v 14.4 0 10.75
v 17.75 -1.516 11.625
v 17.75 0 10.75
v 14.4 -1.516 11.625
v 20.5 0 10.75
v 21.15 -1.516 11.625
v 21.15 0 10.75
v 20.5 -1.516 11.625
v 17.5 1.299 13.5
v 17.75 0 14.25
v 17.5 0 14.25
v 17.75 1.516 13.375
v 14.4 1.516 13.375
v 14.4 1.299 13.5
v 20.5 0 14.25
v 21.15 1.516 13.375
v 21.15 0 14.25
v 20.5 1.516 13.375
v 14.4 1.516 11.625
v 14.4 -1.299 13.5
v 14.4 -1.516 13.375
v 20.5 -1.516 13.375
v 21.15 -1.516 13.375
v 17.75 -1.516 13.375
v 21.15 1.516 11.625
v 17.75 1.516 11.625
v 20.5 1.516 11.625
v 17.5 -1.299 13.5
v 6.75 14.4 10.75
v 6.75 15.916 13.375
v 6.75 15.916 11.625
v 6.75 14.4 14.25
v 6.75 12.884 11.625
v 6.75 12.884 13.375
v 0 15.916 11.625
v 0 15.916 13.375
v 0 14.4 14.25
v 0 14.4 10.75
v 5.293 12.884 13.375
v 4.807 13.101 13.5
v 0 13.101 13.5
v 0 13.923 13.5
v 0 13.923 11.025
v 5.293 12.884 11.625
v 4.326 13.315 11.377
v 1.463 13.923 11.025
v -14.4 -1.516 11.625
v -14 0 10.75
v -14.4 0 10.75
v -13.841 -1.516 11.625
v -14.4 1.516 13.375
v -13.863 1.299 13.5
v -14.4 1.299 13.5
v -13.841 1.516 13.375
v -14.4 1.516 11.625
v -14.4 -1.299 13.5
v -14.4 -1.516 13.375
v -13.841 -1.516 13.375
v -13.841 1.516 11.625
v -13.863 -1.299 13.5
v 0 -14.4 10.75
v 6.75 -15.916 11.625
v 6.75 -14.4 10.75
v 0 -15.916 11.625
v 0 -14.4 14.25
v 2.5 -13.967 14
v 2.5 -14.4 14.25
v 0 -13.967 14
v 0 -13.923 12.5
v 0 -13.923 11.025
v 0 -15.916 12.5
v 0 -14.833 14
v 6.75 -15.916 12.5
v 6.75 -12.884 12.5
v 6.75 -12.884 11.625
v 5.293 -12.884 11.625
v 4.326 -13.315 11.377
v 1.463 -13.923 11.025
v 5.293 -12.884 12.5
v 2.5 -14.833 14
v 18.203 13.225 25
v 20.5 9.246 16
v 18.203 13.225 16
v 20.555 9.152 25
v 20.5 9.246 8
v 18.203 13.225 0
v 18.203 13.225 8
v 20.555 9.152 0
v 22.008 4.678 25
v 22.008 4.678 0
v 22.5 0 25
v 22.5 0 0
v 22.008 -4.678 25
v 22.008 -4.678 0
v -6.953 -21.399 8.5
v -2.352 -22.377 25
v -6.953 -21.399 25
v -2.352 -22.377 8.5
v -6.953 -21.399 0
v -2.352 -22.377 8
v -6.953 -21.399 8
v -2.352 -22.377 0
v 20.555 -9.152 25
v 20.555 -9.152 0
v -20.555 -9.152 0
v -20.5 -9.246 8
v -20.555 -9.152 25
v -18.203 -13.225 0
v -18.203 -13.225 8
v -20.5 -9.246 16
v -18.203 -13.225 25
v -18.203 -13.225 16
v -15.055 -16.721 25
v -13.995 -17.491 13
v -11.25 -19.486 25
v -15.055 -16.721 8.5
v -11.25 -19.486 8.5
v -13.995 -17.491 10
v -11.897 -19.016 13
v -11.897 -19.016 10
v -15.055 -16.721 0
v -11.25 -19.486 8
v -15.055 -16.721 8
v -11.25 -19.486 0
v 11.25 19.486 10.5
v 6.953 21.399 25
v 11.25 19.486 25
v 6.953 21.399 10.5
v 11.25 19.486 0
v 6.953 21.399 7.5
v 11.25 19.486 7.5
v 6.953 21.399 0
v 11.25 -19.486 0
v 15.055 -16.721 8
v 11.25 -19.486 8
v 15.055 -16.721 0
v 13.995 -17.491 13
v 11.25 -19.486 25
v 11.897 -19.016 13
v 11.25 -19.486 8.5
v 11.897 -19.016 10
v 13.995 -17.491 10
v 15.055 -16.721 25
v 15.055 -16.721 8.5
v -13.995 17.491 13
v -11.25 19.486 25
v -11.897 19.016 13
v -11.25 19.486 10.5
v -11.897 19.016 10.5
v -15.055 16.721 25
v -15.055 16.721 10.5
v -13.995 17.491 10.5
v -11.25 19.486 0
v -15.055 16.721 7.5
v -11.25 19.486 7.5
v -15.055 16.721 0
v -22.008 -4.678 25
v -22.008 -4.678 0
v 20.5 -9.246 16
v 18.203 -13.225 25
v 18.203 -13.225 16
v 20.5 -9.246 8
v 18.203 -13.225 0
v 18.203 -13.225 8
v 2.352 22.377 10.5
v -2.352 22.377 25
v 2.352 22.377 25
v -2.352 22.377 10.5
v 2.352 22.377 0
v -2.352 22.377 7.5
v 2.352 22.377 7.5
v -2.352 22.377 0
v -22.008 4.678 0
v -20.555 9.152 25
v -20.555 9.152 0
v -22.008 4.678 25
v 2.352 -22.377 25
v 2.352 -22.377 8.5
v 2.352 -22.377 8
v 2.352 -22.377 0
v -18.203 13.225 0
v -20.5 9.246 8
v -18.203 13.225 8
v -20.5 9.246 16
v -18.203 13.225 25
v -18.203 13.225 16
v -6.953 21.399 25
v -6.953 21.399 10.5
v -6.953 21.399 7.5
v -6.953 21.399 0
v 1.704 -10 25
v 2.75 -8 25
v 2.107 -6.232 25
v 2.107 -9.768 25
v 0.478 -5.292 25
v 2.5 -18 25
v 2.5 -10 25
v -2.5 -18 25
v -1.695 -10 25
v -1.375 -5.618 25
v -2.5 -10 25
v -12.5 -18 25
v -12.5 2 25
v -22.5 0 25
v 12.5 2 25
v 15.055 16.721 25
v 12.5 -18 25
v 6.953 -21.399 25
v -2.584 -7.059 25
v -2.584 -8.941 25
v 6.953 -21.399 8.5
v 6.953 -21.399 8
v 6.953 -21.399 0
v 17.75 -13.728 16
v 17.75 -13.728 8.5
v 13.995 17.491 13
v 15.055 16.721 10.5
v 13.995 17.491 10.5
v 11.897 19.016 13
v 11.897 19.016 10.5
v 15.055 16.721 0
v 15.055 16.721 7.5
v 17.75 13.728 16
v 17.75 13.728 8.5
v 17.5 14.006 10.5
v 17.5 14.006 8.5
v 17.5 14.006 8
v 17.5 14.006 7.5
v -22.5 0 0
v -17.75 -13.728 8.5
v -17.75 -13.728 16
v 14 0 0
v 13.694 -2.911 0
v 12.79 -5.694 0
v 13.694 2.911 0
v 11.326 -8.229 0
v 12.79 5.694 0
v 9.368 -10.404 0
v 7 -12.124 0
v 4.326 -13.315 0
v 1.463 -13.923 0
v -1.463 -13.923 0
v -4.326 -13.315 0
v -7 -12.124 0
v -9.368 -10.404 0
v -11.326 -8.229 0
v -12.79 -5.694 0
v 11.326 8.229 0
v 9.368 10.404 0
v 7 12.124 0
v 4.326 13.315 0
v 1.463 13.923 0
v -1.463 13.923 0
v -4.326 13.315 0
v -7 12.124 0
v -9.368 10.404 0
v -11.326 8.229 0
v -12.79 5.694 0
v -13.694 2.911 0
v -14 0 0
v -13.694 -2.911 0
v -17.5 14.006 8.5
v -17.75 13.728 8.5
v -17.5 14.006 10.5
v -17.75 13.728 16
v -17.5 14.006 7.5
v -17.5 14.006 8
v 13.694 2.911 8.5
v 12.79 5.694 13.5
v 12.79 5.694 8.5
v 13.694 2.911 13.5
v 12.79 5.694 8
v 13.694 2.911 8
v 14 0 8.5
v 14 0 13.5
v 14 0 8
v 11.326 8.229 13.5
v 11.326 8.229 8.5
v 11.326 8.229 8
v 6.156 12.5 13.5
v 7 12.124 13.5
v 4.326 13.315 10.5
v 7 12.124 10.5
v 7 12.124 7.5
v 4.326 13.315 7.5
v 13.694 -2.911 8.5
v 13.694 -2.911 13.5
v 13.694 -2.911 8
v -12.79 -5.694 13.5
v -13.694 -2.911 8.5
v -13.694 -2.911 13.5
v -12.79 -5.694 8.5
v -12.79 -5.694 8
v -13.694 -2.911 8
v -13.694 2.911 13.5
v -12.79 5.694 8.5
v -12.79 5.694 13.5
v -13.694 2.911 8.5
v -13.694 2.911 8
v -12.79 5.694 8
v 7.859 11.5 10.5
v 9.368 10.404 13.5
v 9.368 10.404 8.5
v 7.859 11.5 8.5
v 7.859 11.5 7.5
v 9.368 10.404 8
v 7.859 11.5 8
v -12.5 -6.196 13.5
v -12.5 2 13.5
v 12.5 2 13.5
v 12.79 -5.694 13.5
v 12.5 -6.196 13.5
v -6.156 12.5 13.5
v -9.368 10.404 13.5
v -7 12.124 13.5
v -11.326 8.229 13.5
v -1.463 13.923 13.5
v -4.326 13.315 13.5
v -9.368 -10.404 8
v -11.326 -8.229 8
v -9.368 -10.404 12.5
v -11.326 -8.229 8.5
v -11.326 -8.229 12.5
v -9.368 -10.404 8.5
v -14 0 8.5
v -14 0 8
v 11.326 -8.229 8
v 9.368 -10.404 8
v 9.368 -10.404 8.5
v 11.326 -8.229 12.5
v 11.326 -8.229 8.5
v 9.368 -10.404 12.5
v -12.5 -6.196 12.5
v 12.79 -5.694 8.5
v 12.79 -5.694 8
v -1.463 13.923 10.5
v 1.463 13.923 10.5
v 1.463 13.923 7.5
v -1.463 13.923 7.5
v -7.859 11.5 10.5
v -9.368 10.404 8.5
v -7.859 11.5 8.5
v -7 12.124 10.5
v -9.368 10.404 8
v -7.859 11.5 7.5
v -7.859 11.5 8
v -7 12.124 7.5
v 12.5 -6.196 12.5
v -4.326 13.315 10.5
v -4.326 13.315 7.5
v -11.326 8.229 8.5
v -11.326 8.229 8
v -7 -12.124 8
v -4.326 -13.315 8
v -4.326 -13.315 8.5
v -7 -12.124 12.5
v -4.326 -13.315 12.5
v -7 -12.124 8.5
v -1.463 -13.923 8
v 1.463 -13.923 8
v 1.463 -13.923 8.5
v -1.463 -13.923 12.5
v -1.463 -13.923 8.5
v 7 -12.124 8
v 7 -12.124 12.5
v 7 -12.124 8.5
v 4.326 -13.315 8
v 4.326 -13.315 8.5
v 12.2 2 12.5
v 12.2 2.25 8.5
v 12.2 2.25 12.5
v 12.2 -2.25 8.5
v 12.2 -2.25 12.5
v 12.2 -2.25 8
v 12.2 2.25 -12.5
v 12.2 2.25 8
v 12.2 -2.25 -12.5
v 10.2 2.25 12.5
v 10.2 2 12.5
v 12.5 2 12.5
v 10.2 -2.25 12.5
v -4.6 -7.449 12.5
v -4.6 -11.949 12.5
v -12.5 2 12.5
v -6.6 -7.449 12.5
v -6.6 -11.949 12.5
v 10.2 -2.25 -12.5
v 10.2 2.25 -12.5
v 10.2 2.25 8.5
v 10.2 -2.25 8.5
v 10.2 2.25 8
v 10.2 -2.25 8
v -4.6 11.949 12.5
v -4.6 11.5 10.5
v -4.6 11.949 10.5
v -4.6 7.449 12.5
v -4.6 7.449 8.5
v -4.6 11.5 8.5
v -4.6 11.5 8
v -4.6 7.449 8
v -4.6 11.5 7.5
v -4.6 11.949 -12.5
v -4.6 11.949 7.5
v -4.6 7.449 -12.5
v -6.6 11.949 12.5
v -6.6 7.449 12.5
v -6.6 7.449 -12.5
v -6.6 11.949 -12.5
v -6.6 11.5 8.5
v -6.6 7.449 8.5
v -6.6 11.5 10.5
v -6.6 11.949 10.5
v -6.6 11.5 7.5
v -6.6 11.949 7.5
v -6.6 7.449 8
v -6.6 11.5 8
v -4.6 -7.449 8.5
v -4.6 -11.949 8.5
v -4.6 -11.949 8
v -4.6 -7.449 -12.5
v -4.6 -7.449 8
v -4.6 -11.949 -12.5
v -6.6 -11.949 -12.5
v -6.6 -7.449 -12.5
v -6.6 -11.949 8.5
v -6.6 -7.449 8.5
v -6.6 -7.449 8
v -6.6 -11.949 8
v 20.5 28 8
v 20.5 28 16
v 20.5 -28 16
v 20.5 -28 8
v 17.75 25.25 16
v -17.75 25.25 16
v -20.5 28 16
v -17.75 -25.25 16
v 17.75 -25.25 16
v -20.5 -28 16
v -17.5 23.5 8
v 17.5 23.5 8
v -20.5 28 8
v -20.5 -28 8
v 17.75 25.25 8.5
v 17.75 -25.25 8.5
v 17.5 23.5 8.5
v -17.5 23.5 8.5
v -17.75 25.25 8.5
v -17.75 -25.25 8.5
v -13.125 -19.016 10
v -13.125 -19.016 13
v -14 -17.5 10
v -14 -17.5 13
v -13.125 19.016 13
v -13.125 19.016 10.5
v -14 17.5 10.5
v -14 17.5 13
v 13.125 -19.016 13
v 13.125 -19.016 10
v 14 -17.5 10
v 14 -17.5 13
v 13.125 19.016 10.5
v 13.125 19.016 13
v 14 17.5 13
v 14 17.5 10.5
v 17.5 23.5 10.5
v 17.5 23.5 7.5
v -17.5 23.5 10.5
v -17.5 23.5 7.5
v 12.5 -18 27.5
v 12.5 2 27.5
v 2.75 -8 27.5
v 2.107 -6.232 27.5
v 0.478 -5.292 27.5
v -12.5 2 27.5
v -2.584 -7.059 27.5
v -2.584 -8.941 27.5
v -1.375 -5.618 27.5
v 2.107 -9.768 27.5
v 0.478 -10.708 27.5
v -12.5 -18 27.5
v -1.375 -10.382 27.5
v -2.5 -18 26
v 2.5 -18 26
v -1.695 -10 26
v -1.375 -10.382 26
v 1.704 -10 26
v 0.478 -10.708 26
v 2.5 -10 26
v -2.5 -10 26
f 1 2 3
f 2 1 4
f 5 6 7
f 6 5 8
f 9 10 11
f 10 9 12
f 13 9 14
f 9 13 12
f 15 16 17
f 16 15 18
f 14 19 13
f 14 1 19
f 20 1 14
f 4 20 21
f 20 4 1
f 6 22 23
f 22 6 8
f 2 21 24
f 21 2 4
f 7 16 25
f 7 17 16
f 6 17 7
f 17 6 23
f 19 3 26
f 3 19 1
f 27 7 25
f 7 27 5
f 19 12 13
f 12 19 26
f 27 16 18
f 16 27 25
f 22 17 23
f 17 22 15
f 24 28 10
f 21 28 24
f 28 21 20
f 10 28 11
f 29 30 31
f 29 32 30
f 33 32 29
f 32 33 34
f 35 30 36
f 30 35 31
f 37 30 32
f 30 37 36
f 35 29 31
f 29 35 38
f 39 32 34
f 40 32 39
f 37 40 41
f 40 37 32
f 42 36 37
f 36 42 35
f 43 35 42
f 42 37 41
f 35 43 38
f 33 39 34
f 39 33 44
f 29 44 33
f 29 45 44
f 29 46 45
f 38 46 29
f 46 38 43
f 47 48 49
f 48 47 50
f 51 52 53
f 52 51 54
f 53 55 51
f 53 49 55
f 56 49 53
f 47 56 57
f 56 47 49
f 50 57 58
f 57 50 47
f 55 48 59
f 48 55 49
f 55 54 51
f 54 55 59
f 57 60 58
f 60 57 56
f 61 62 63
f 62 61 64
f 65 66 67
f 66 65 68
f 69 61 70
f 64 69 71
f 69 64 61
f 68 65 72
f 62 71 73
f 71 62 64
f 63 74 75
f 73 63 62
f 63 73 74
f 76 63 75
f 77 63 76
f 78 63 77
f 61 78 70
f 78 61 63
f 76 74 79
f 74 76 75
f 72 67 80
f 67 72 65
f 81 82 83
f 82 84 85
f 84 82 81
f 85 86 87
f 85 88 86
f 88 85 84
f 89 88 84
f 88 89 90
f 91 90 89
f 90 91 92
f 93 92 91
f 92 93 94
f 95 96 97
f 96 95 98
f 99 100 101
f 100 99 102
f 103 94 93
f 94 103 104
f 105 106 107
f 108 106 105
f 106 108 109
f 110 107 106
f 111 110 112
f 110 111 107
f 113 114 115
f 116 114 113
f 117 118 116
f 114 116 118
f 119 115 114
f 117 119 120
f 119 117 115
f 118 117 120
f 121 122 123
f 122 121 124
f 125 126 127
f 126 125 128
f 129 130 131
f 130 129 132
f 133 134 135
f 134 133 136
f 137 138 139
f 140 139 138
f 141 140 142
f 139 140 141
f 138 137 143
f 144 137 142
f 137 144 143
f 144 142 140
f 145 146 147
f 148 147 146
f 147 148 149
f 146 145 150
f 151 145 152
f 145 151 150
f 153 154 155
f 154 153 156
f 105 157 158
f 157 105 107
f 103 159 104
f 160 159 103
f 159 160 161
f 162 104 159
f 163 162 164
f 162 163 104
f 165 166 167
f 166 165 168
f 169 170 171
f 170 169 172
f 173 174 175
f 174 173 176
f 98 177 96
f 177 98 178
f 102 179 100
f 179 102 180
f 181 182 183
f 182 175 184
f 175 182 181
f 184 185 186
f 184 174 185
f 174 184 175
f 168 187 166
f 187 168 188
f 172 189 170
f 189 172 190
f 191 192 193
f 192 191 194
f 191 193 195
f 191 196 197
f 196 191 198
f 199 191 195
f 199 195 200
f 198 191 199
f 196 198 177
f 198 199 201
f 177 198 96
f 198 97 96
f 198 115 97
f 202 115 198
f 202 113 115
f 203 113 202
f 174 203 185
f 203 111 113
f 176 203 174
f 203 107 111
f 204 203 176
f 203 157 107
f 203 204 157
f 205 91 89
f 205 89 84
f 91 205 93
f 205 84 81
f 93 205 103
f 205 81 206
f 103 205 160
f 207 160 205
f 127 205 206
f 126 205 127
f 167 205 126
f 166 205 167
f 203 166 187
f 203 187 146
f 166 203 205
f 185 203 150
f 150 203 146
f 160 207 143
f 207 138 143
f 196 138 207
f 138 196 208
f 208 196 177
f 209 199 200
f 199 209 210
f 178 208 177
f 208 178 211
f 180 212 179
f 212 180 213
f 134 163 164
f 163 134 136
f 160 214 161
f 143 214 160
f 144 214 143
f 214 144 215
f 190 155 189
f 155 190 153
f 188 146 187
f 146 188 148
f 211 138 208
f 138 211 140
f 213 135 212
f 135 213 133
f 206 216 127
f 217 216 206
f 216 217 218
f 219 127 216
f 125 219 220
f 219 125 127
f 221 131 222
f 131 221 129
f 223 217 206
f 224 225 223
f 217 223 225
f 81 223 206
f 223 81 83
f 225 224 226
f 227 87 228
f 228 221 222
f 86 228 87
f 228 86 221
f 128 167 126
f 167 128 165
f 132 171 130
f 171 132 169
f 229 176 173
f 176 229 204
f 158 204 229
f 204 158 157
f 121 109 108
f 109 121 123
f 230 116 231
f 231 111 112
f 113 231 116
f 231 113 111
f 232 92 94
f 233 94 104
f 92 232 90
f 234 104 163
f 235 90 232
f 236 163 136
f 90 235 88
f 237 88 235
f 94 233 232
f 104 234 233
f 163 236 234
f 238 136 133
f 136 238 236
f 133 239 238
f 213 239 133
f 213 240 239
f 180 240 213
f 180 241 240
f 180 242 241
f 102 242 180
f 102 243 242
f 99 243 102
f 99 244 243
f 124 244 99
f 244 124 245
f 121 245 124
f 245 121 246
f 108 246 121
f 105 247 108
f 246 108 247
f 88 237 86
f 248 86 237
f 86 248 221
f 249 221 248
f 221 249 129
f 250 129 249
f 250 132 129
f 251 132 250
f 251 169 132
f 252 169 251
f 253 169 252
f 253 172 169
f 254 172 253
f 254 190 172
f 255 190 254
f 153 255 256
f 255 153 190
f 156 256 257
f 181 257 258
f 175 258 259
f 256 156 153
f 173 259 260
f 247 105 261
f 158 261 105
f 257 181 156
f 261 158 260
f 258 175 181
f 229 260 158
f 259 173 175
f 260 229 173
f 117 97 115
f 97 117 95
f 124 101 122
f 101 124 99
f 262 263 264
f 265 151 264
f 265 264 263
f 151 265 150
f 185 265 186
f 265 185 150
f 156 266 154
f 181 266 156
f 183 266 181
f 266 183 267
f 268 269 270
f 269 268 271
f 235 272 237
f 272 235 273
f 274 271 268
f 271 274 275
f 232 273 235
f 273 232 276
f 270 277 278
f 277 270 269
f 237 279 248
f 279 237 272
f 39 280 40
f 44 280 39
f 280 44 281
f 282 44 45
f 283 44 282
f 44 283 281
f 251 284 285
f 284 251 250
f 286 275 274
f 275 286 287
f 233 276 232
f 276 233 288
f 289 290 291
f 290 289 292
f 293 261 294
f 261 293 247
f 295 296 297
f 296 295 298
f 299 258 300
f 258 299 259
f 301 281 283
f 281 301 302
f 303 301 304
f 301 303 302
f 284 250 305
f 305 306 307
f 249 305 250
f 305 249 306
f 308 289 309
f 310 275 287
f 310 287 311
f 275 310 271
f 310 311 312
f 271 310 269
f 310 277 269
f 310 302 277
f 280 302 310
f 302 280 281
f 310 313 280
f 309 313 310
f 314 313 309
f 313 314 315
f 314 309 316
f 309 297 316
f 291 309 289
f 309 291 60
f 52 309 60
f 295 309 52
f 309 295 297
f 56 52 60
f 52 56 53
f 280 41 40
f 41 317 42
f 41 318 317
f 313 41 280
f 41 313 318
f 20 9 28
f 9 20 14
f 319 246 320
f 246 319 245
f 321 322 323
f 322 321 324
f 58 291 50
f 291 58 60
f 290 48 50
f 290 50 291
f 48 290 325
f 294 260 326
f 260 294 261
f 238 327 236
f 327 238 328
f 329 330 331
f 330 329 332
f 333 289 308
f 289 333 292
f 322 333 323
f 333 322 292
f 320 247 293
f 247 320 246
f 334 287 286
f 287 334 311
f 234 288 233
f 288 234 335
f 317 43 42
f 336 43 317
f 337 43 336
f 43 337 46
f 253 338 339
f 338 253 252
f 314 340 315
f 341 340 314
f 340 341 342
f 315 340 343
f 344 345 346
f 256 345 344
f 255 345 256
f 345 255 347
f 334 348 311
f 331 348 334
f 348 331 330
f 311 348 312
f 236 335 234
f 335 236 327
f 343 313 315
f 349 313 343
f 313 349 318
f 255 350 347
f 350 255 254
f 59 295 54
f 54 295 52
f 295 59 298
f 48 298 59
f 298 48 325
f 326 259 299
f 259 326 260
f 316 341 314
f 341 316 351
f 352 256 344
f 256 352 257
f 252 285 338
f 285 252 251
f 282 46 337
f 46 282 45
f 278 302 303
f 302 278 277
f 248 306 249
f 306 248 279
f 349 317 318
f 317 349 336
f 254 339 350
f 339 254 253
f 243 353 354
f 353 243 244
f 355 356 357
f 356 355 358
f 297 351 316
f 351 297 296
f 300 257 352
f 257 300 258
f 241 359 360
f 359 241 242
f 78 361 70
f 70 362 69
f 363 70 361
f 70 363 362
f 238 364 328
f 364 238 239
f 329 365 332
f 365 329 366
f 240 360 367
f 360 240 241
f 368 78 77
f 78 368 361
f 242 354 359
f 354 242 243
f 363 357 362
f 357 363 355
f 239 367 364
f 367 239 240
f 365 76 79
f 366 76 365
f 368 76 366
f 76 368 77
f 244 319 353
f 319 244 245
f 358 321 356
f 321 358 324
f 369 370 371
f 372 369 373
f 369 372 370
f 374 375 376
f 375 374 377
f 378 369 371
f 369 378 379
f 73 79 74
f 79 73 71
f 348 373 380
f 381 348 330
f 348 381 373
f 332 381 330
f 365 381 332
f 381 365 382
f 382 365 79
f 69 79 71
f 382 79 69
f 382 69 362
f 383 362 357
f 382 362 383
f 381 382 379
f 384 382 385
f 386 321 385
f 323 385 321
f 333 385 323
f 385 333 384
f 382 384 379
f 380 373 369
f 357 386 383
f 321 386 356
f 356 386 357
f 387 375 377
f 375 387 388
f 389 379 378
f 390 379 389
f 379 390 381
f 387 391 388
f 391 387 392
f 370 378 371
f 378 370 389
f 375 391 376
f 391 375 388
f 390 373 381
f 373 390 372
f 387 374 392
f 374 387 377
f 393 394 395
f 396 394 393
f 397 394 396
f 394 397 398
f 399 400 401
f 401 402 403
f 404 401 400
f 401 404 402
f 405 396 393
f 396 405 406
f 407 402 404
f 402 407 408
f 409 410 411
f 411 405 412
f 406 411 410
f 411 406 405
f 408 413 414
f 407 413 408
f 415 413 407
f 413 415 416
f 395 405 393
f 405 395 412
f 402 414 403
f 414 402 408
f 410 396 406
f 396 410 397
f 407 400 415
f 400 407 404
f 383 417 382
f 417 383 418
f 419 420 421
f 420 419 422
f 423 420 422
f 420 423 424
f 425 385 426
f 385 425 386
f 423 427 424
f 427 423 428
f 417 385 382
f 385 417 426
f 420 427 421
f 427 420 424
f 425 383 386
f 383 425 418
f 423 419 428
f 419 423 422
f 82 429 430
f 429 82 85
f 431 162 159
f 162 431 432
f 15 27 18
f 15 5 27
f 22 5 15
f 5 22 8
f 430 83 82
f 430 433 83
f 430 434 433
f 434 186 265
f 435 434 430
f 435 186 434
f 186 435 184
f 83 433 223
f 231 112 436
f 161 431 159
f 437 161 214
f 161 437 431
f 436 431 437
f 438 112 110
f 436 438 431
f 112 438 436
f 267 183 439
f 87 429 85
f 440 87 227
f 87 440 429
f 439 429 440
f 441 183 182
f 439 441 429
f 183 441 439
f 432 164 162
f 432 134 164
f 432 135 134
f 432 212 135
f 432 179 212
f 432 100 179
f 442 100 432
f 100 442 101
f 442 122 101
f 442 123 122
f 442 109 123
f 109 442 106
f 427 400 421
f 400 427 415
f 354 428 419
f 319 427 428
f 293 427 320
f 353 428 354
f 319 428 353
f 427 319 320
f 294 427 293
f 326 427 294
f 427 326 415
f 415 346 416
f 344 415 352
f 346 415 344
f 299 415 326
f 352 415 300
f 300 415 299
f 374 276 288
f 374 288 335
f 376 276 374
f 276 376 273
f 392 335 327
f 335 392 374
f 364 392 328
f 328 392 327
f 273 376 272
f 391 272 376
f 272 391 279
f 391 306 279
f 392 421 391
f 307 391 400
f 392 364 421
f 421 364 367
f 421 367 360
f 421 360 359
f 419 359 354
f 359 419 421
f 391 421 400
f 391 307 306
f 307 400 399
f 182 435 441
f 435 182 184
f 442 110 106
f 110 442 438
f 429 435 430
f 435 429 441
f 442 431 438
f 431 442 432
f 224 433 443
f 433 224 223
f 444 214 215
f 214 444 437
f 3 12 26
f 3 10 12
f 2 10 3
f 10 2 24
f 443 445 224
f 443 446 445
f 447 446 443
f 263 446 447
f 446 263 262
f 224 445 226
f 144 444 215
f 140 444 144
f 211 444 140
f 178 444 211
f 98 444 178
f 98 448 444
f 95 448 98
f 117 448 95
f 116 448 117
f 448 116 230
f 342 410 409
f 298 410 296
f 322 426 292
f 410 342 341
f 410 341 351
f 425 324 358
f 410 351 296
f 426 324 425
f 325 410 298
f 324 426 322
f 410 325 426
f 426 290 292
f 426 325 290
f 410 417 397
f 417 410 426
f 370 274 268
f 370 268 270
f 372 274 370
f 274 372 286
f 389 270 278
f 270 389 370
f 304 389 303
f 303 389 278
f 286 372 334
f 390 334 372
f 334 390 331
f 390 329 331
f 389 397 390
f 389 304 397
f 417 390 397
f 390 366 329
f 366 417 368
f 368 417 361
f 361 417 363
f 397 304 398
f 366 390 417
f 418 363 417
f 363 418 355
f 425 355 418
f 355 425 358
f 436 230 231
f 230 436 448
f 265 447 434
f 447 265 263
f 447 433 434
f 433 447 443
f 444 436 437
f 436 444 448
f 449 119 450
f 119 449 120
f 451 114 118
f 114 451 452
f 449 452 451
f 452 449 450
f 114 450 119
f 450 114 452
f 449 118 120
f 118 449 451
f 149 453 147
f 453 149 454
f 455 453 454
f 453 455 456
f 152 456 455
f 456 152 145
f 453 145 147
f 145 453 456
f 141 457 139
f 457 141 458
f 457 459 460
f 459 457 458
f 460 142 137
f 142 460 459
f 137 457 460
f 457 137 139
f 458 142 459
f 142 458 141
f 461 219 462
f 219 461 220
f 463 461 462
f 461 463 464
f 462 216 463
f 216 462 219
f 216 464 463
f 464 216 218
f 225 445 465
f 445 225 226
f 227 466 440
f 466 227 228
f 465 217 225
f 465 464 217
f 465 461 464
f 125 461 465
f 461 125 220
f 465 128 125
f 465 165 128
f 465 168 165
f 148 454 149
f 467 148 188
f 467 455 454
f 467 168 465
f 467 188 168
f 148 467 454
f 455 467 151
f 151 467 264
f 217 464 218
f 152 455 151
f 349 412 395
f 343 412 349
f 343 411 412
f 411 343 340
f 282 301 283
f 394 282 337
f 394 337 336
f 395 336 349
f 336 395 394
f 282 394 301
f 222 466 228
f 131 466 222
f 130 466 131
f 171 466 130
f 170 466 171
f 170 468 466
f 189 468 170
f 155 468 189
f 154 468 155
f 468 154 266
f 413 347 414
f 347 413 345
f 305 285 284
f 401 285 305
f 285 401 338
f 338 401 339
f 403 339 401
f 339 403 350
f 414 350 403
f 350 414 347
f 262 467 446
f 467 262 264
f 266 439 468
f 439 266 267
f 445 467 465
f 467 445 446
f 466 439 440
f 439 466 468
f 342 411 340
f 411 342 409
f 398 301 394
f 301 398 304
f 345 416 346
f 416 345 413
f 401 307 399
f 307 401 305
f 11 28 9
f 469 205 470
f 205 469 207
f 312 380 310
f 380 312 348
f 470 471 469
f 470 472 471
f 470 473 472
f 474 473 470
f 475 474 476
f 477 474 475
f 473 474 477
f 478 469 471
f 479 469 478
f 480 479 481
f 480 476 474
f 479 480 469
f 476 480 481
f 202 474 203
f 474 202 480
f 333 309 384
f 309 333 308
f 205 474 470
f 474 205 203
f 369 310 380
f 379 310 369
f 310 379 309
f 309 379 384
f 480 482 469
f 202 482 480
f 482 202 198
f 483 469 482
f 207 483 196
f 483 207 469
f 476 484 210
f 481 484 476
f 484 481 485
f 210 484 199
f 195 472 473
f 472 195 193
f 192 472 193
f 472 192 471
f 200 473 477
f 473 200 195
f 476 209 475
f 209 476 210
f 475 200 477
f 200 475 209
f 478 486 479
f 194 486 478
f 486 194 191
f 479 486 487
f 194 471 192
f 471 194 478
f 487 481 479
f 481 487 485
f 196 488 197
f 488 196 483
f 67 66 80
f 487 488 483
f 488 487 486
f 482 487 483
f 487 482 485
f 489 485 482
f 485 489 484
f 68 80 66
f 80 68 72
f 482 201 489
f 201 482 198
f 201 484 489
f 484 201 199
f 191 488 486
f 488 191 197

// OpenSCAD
// Goblin Hand Wrist Assembly
// Connects hand to arm, routes power/control, holds servo controller ESP32

// ==============================================================================
// DIMENSIONS
// ==============================================================================

// Wrist connector specs
WRIST_OD = 45.0;            // Outer diameter connection to arm
WRIST_ID = 28.0;            // Inner diameter (cable pass-through)
WRIST_LENGTH = 25.0;        // Depth of connector

// Servo controller PCB (custom board with servo drivers)
CONTROLLER_LENGTH = 50.0;   // PCB length
CONTROLLER_WIDTH = 35.0;    // PCB width
CONTROLLER_HEIGHT = 8.0;    // PCB height (with components)

// ESP32-S3 placement
ESP32_LENGTH = 27.0;        // Length of devkit
ESP32_WIDTH = 14.0;         // Width of devkit
ESP32_HEIGHT = 4.0;         // Height

// Power connector (5V input from arm ESP32)
POWER_CONNECTOR_D = 5.5;    // XT30 connector inner diameter
SIGNAL_CONNECTOR_D = 3.5;   // I2C/signal connector

// ==============================================================================
// WRIST CONNECTOR STRUCTURE
// ==============================================================================

module wrist_connector_housing(od, id, length) {
    difference() {
        // Outer cylindrical housing
        cylinder(h=length, d=od);
        
        // Inner cavity for cable pass-through
        cylinder(h=length+2, d=id, center=true);
        
        // Mounting holes (M3) - attach hand to arm
        for(angle = [0, 90, 180, 270]) {
            x = cos(angle) * (od*0.32);
            y = sin(angle) * (od*0.32);
            translate([x, y, length*0.5])
                rotate([0, 90, 0])
                    cylinder(h=od*0.15, d=3.5);
        }
        
        // Cable strain relief channels (prevent sharp bends)
        for(i = [0, 120, 240]) {
            angle = i;
            translate([cos(angle)*(od*0.25), sin(angle)*(od*0.25), 0])
                translate([0, 0, length*0.3])
                    rotate([45, 0, angle])
                        cube([3, 3, length*0.4], center=true);
        }
    }
    
    // Internal stiffening ribs (prevent collapse)
    for(angle = [0, 120, 240]) {
        translate([cos(angle)*(id*0.4), sin(angle)*(id*0.4), 0])
            cube([2, od*0.1, length], center=true);
    }
}

// ==============================================================================
// SERVO CONTROLLER PCB MOUNTING
// ==============================================================================

module servo_controller_bracket() {
    // Mounts inside wrist connector
    // Holds: custom servo driver PCB + ESP32-S3 + power connectors
    
    difference() {
        // Main bracket body
        translate([0, 0, 0])
            cube([CONTROLLER_WIDTH + 6, CONTROLLER_LENGTH + 6, 8], center=true);
        
        // PCB cavity
        translate([0, 0, 1])
            cube([CONTROLLER_WIDTH + 0.5, CONTROLLER_LENGTH + 0.5, CONTROLLER_HEIGHT + 1], center=true);
    }
    
    // PCB support posts (M2.5 threaded inserts)
    for(x = [-CONTROLLER_WIDTH*0.35, CONTROLLER_WIDTH*0.35]) {
        for(y = [-CONTROLLER_LENGTH*0.35, CONTROLLER_LENGTH*0.35]) {
            translate([x, y, -2])
                cylinder(h=3, d=3.5);
        }
    }
    
    // Heat dissipation: mounting for aluminum heatsink under power MOSFETs
    translate([0, CONTROLLER_LENGTH*0.35, -3])
        difference() {
            cube([CONTROLLER_WIDTH, 12, 3], center=true);
            cylinder(h=4, d=3.5);  // Screw hole
        }
}

// ==============================================================================
// POWER CONNECTOR MOUNT
// ==============================================================================

module power_connector_housing() {
    // Mounts XT30 connector (incoming 5V from arm)
    // Feeds: servo power distribution + ESP32 power
    
    difference() {
        // Housing block
        cube([25, 20, 15], center=true);
        
        // XT30 connector cavity
        translate([0, 0, 2])
            cylinder(h=8, d=POWER_CONNECTOR_D);
        
        // Backshell mounting hole
        translate([0, 0, -5])
            cylinder(h=3, d=6.0);
        
        // Cable routing channel
        translate([0, -8, 0])
            cube([5, 12, 12], center=true);
    }
    
    // Strain relief boot mounting points
    for(x = [-8, 8]) {
        translate([x, 0, 4])
            cylinder(h=3, d=2.5);
    }
}

// ==============================================================================
// I2C SIGNAL CONNECTOR
// ==============================================================================

module i2c_signal_connector_mount() {
    // Small connector for I2C communication with arm ESP32
    // Carries: SDA, SCL, GND from hand controller back to arm
    
    difference() {
        // Housing
        cube([15, 12, 10], center=true);
        
        // Connector cavity (small 4-pin)
        translate([0, 0, 2])
            cube([8, 8, 6], center=true);
        
        // Cable routing
        translate([0, -5, 0])
            cylinder(h=8, d=2.5, center=true);
    }
}

// ==============================================================================
// SERVO DISTRIBUTION BOARD
// ==============================================================================

module servo_pwm_distribution() {
    // Distributes 3 PWM signals from ESP32 to 3 servo motors
    // Also provides servo power filtering
    
    difference() {
        // Main board area
        cube([CONTROLLER_WIDTH, 25, 3], center=true);
        
        // Component mounting holes
        // 3× servo signal headers
        for(i = [0:2]) {
            y = -8 + i*8;
            translate([-CONTROLLER_WIDTH*0.3, y, 2])
                cylinder(h=4, d=2.5);
        }
        
        // Power distribution mosfet mounting
        translate([CONTROLLER_WIDTH*0.3, -8, 2])
            cylinder(h=4, d=4.5);
    }
    
    // Servo connectors (standard 3-pin headers)
    for(i = [0:2]) {
        y = -8 + i*8;
        translate([-CONTROLLER_WIDTH*0.3, y, 2])
            translate([0, 0, 1.5])
                cube([3, 2.54*3, 2], center=true);
    }
    
    // Power filtering capacitor mounts
    for(x = [CONTROLLER_WIDTH*0.1, CONTROLLER_WIDTH*0.4]) {
        translate([x, 8, 2])
            cylinder(h=3, d=6);
    }
}

// ==============================================================================
// COMPLETE WRIST & CONTROLLER ASSEMBLY
// ==============================================================================

module goblin_hand_wrist_assembly() {
    echo("=== Goblin Hand Wrist & Controller Assembly ===");
    echo("");
    echo("Components:");
    echo("1. Wrist connector (aluminum or PEEK)");
    echo("2. Servo controller PCB (custom PWM board)");
    echo("3. ESP32-S3 microcontroller");
    echo("4. Power input (XT30, from arm ESP32)");
    echo("5. I2C communication link (back to arm)");
    echo("");
    echo("Architecture:");
    echo("- Arm ESP32 broadcasts mood/gesture state via SharedMemory");
    echo("- Hand ESP32 reads SharedMemory state locally (no wiring)");
    echo("- Hand ESP32 computes servo PWM signals from state");
    echo("- Servo motors receive PWM -> perform grip/gesture");
    echo("- Hand ESP32 writes thermal/load feedback to SharedMemory");
    echo("");
    echo("Power Flow:");
    echo("- 5V comes from arm via XT30 (no long power wires!)");
    echo("- Hand PCB filters and distributes to 3 servo motors");
    echo("- Per-hand power consumption: 2-15W (thermal max 25W)");
    echo("");
    
    // Render components
    color([0.5, 0.5, 0.5]) {
        wrist_connector_housing(WRIST_OD, WRIST_ID, WRIST_LENGTH);
    }
    
    color([0.3, 0.6, 0.9]) {
        translate([0, 0, 12])
            servo_controller_bracket();
    }
    
    color([0.2, 0.4, 0.6]) {
        translate([0, 0, 15])
            servo_pwm_distribution();
    }
    
    color([0.7, 0.2, 0.2]) {
        translate([0, -8, 20])
            power_connector_housing();
    }
    
    color([0.2, 0.7, 0.2]) {
        translate([0, 8, 20])
            i2c_signal_connector_mount();
    }
}

// ==============================================================================
// WIRING DIAGRAM (Non-rendered, for documentation)
// ==============================================================================

/*
WRIST ELECTRICAL INTERFACE:

ARM ESP32 (Main Brain)
    │
    ├─ SharedMemory broadcast (ESP-NOW wireless)
    │   └─> Hand ESP32 receives mood/gesture state
    │
    └─ 5V power to hand (XT30 connector)
       │
       └─ WRIST CONNECTOR (Physical Interface)
          │
          ├─ 5V power input (XT30 Red/Black)
          ├─ I2C signal return (SDA, SCL, GND)
          │
          └─ HAND WRIST ASSEMBLY
             │
             ├─ Servo Controller PCB
             │  ├─ ESP32-S3 (hand local control)
             │  ├─ 3× PWM driver outputs
             │  ├─ Power filtering (10µF + 100µF caps)
             │  └─ Thermal sensor (DS18B20)
             │
             └─ Servo Power Distribution
                ├─ MOSFET gate drivers
                ├─ Current limiting resistors
                ├─ Servo #1 (main finger curl) → PWM ch0
                ├─ Servo #2 (pinky) → PWM ch1
                └─ Servo #3 (thumb opposition) → PWM ch2

CONTROL SIGNAL FLOW:
Arm ESP32 writes to SharedMemory:
  {hand_state: "gripping", grip_strength: 80%, target_temp: +15C}

Hand ESP32 reads locally (FAST, no wireless overhead):
  {hand_state, grip_strength} → compute servo angles

Hand servos move → gripping action

Hand ESP32 measures:
  - Servo current per motor
  - Palm temperature
  - Load force estimate
  
Hand ESP32 writes back to SharedMemory:
  {hand_temp: 32C, hand_current: 450mA, hand_load: 4.2N}

Arm ESP32 checks: if temp > 35C, reduce next animation

NO WIRES between arm and hand except 5V power!
ALL COORDINATION via ESP-NOW wireless mesh.
*/

// ==============================================================================
// WEIGHT & THERMAL ESTIMATES
// ==============================================================================

function estimate_wrist_assembly_weight() =
    let(
        wrist_connector = 15.0,      // Aluminum tube + fittings
        controller_pcb = 12.0,       // PCB + components
        esp32 = 20.0,                // ESP32-S3 devkit
        power_distribution = 8.0,    // Capacitors, MOSFETs, resistors
        connectors = 6.0,            // XT30, I2C connectors
        mounting_hardware = 5.0,     // Screws, heatsink, standoffs
        
        total = wrist_connector + controller_pcb + esp32 + 
                power_distribution + connectors + mounting_hardware
    )
    total;

function estimate_hand_thermal_performance() =
    let(
        // 3 servo motors, each generating 0-2W heat
        servo_max = 2.0 * 3,         // 6W maximum from servos
        pcb_dissipation = 1.0,       // 1W from controller
        linkage_friction = 0.5,      // 0.5W from cable/bearing friction
        
        // Thermal resistance (K/W) in confined hand space
        theta_ja = 4.5,              // Poor cooling (enclosed plastic)
        
        // Operating points
        idle_power = 0.1,
        idle_temp_rise = idle_power * theta_ja,
        
        moderate_power = 3.0,        // Typical gripping
        moderate_temp_rise = moderate_power * theta_ja,
        
        peak_power = 7.0,            // Brief maximum grip
        peak_temp_rise = peak_power * theta_ja
    )
    [
        ["Idle", idle_power, idle_temp_rise],
        ["Moderate grip", moderate_power, moderate_temp_rise],
        ["Peak grip", peak_power, peak_temp_rise]
    ];

// ==============================================================================
// RENDERING
// ==============================================================================

goblin_hand_wrist_assembly();

echo("");
echo(str("Wrist Assembly Weight: ", estimate_wrist_assembly_weight(), " grams"));
echo("");
echo("=== THERMAL PERFORMANCE ===");
thermal_table = estimate_hand_thermal_performance();
for(i=[0:len(thermal_table)-1]) {
    row = thermal_table[i];
    echo(str(row[0], ": ", row[1], "W → +", row[2], "°C rise"));
}
